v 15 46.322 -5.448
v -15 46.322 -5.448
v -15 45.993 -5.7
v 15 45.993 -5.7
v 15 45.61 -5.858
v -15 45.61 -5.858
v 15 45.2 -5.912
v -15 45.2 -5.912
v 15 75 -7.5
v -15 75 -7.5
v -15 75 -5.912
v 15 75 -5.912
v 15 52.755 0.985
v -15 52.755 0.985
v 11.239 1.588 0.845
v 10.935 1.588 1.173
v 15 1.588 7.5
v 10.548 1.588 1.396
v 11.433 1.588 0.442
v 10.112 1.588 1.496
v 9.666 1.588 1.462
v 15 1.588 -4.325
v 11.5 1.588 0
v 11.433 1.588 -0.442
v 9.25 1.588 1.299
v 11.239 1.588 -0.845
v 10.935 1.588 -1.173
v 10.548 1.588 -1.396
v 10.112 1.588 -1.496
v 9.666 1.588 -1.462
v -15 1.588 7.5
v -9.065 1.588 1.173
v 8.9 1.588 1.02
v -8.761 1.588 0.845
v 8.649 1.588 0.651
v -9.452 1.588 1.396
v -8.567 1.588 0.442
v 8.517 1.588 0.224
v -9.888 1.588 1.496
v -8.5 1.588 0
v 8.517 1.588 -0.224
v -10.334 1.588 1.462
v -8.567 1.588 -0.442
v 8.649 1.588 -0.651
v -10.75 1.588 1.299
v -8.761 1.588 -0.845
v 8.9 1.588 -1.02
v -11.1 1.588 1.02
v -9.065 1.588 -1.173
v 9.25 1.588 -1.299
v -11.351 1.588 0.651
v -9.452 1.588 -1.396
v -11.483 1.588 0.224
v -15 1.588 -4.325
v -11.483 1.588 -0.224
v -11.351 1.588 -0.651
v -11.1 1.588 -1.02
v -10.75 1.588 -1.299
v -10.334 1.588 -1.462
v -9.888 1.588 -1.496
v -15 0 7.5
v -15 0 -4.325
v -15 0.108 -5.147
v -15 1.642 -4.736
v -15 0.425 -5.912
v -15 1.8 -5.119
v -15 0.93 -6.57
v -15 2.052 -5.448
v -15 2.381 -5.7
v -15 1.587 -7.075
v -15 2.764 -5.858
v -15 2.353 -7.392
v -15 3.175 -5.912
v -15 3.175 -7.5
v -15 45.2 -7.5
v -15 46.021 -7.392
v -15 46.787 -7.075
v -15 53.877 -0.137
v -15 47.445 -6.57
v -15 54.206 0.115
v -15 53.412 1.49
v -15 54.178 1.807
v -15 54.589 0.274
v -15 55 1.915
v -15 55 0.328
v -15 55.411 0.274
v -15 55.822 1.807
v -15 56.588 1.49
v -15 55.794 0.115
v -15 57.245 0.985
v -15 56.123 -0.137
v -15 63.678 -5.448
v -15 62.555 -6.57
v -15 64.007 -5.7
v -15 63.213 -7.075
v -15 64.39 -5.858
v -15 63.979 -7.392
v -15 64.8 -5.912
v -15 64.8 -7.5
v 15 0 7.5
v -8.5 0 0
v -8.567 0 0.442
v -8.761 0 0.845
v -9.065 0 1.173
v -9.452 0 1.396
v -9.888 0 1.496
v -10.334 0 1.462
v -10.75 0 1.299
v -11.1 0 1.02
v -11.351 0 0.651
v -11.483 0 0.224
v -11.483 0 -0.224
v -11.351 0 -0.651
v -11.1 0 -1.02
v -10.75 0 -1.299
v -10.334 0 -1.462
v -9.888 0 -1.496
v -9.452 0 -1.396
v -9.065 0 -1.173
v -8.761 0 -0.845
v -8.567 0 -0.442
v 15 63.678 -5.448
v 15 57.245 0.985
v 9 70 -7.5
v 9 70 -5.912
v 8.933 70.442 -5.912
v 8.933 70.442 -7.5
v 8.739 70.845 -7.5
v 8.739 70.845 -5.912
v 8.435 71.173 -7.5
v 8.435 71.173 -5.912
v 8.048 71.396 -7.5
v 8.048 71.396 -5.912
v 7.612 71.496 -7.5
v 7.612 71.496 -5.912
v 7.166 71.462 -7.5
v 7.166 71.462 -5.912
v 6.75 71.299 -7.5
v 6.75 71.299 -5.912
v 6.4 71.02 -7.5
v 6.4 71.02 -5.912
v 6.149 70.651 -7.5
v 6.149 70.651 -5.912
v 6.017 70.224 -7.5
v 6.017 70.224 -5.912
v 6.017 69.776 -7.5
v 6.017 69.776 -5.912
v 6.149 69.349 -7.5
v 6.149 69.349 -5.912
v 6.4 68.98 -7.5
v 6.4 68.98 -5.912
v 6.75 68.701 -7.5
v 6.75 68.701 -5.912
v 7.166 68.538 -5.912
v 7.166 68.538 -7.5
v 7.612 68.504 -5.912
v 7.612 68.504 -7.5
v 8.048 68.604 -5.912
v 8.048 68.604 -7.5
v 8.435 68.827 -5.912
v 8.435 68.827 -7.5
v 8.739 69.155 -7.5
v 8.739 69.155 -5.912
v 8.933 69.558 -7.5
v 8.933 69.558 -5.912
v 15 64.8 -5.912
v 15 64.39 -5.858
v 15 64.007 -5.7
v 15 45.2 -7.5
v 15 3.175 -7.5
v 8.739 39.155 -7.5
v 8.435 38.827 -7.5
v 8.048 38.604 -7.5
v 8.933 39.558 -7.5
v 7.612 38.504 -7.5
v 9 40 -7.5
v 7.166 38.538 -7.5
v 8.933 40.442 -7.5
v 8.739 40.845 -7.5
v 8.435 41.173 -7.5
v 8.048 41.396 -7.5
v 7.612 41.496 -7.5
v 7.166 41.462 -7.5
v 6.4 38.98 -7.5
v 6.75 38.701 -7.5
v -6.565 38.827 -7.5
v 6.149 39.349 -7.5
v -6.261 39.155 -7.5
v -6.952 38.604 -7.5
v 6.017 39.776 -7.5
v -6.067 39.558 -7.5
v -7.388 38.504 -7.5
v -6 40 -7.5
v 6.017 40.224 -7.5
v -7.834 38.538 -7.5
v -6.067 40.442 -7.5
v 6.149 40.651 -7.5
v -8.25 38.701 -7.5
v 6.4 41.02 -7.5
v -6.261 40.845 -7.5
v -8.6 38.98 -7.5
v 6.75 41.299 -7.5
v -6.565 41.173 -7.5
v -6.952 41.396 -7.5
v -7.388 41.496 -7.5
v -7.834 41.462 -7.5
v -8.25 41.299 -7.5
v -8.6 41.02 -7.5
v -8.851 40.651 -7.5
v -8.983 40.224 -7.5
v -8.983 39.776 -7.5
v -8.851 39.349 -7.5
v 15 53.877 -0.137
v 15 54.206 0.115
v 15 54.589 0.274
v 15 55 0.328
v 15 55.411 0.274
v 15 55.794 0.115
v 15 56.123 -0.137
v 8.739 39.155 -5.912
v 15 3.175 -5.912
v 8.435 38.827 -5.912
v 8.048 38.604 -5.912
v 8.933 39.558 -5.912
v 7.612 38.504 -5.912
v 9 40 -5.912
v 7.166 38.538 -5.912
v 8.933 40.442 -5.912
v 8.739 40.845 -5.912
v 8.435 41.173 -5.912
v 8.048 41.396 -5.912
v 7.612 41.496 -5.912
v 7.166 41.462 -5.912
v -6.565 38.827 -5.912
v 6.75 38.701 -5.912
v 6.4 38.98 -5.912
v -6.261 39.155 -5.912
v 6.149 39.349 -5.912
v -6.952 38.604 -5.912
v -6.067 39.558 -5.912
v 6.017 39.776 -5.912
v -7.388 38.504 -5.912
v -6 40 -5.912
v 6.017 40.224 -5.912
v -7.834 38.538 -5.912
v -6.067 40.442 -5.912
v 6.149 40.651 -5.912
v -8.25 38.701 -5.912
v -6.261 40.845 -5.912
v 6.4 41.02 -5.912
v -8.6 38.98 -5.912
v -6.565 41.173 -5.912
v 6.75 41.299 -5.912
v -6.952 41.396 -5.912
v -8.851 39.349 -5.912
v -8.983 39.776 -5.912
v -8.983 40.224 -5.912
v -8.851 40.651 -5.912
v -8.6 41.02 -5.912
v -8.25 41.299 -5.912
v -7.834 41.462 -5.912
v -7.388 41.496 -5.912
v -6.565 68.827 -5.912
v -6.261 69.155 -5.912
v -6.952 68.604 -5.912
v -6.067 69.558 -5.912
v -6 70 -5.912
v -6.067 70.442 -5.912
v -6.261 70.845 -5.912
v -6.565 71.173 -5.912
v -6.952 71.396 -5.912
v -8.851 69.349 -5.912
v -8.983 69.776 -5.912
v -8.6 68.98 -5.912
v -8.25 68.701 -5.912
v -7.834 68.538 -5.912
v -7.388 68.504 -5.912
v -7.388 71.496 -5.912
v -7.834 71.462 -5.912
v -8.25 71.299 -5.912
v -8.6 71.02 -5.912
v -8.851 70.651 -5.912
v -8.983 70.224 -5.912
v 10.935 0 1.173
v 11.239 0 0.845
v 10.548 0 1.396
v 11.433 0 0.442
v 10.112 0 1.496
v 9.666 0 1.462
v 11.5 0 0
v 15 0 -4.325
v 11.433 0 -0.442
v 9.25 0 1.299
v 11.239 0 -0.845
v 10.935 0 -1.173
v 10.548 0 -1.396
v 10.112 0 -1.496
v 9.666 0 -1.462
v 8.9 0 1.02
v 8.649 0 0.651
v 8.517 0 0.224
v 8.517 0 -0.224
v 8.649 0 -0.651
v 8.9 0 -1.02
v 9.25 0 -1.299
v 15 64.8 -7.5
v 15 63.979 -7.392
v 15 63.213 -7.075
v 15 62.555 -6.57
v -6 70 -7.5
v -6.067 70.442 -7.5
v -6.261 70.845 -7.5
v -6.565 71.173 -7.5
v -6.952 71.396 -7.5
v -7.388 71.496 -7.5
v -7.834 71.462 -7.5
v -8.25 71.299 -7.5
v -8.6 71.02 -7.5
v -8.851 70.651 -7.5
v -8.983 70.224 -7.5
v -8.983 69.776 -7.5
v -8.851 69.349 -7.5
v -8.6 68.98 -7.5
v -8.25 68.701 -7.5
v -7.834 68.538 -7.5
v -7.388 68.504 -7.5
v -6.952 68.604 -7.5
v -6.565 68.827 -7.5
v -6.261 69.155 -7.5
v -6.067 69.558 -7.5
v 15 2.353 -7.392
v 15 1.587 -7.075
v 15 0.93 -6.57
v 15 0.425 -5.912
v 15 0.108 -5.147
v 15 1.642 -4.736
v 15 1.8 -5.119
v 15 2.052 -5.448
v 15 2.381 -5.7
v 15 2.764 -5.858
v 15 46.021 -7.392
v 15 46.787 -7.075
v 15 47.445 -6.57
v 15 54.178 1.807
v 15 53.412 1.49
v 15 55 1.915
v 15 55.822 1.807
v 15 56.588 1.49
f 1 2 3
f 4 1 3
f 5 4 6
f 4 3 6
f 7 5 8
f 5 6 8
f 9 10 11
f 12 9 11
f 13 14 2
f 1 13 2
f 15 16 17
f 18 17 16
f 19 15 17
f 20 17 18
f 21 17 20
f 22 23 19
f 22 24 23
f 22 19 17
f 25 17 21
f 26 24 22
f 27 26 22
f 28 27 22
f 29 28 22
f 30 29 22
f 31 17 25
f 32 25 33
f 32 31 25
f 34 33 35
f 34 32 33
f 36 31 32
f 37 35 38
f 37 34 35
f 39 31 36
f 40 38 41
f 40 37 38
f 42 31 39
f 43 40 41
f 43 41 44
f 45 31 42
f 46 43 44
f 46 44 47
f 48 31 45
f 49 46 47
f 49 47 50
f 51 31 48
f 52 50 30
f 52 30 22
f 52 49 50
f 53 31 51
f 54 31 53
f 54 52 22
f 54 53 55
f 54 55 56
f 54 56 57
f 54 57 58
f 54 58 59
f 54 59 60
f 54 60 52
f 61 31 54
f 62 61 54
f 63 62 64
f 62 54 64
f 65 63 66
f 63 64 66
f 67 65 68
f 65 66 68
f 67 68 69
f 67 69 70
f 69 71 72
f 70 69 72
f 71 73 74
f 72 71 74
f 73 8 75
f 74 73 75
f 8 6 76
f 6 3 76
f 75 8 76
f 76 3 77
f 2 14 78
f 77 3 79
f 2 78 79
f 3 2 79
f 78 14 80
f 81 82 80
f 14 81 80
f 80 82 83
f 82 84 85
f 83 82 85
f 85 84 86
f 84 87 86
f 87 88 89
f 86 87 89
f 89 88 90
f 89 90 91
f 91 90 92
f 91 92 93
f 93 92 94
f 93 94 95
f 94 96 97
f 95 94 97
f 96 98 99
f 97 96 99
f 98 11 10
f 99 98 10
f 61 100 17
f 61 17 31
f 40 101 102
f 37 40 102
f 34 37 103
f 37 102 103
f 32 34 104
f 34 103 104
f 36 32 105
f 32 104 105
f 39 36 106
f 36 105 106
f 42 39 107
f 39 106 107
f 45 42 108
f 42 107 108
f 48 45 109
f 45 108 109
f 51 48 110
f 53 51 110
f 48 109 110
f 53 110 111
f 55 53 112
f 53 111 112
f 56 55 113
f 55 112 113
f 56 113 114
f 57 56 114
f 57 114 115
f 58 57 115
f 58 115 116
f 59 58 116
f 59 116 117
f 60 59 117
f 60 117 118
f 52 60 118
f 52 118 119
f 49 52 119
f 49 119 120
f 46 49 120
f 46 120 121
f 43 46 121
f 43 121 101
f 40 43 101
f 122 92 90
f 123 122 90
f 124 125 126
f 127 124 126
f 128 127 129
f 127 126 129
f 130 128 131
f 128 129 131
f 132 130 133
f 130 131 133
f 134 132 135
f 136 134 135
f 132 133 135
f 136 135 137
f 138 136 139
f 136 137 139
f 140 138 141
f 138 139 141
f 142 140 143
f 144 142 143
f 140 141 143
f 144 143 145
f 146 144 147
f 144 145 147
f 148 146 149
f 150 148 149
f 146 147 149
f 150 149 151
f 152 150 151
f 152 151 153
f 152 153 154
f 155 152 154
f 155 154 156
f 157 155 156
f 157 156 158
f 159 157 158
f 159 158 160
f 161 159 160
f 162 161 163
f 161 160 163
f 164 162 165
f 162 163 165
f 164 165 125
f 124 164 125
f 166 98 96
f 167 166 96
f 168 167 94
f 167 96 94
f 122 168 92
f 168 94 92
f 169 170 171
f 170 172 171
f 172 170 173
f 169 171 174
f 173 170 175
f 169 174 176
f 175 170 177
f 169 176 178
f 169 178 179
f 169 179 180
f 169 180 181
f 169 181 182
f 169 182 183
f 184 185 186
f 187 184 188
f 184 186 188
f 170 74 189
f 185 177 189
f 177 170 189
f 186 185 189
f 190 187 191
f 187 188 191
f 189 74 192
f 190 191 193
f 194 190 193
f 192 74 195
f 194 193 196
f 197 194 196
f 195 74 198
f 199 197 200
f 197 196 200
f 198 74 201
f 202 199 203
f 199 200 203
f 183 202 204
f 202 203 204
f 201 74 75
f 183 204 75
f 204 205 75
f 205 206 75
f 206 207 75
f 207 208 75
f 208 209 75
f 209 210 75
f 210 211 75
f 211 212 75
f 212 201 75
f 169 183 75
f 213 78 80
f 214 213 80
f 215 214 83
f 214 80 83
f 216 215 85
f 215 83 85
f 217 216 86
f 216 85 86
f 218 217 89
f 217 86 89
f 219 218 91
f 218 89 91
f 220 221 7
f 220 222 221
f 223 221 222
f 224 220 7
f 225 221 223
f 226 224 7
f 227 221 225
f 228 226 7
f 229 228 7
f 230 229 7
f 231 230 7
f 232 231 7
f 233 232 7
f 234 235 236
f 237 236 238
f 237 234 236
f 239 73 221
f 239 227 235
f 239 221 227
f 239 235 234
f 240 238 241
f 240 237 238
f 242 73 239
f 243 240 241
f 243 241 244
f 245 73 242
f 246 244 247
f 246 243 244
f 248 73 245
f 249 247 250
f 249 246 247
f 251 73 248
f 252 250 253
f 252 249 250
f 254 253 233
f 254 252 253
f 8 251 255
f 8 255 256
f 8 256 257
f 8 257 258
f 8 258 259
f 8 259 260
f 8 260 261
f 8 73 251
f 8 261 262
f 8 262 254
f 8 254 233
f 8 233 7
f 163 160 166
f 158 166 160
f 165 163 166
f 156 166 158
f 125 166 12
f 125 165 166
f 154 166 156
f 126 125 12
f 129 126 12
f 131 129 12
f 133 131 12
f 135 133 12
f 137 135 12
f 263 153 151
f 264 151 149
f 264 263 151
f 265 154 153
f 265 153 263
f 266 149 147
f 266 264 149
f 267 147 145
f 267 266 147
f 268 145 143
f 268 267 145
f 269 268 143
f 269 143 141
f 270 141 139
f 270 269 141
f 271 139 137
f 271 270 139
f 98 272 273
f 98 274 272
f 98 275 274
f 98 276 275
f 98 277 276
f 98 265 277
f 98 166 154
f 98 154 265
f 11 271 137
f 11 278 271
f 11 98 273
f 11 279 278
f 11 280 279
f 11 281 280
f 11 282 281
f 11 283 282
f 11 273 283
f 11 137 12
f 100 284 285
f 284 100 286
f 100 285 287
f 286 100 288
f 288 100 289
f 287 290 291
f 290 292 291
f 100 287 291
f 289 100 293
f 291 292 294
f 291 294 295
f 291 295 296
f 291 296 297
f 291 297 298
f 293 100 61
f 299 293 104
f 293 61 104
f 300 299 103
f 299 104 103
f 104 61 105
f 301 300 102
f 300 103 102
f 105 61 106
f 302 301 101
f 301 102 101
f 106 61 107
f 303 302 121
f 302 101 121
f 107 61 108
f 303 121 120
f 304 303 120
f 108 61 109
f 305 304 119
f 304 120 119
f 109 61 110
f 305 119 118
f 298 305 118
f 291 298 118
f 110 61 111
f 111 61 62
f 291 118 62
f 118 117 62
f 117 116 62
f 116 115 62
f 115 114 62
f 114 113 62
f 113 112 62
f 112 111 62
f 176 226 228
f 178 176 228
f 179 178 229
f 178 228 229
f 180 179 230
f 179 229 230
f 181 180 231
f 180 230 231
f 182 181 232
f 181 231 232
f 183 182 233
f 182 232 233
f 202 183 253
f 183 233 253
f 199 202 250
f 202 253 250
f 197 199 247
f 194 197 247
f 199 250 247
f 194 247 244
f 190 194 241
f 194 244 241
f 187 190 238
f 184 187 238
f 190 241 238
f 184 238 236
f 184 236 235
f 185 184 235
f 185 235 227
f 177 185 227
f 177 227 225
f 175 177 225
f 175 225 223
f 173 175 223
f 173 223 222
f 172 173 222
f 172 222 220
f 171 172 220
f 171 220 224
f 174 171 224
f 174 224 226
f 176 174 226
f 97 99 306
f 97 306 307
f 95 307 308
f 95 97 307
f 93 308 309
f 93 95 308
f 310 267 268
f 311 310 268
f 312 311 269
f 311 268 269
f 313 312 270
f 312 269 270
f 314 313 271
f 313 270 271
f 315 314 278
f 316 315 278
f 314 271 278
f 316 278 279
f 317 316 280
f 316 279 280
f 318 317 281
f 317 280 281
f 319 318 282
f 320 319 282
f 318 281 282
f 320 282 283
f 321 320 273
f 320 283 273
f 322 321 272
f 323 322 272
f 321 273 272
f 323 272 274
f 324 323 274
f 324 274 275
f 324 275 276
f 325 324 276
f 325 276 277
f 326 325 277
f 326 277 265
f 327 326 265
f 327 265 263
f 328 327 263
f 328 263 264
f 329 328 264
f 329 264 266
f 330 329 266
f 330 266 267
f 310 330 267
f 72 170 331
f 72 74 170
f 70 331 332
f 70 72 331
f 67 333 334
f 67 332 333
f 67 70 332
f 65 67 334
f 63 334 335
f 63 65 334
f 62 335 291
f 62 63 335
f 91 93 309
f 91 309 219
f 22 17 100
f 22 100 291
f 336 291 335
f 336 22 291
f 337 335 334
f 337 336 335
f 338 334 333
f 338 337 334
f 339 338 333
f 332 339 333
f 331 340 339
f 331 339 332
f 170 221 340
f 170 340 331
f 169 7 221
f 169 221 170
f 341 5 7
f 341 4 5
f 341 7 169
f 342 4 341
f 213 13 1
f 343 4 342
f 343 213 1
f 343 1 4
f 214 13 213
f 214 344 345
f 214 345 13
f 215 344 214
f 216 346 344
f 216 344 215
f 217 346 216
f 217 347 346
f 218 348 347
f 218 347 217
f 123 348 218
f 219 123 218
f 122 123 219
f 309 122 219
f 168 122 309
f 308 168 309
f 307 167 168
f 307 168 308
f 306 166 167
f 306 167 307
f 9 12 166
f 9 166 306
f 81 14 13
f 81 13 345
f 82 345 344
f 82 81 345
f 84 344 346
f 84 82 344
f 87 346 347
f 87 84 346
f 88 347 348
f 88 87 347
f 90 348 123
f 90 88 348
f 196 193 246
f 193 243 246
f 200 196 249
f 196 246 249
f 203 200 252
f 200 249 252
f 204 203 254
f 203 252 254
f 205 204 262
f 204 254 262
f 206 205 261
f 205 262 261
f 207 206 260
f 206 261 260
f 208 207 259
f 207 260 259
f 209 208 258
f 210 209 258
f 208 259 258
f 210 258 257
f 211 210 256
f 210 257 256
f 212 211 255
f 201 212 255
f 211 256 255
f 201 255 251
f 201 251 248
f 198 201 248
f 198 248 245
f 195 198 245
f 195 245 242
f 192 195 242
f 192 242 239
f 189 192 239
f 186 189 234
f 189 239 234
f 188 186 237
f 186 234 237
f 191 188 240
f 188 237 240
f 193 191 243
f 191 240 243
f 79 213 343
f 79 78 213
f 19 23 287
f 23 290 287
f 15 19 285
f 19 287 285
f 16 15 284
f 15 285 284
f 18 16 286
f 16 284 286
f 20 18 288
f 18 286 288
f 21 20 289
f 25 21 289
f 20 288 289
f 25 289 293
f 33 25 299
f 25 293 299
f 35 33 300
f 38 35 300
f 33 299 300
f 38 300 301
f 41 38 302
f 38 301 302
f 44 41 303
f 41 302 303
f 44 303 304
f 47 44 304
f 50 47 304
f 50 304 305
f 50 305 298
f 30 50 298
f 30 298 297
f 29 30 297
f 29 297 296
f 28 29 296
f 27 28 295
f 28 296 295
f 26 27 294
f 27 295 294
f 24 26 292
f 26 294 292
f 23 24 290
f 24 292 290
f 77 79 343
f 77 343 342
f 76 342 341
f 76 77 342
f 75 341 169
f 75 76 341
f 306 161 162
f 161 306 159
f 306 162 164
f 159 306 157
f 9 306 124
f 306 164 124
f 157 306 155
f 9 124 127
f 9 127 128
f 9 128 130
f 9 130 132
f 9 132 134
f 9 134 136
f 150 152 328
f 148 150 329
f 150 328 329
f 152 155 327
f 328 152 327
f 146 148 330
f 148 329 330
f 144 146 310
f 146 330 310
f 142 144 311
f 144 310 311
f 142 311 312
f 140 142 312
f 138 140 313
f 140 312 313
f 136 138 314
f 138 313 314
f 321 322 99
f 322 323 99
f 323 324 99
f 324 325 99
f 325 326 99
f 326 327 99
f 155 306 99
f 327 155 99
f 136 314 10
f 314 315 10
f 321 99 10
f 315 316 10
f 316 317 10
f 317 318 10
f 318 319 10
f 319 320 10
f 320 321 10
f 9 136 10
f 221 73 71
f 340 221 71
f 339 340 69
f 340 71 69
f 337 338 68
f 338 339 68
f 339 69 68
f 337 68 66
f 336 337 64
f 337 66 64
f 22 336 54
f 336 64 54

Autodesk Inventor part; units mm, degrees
ref_plane "YZ Plane" through (0, 0, 0) normal (1, 0, 0) x (0, 1, 0)
ref_plane "XZ Plane" through (0, 0, 0) normal (0, 1, 0) x (-1, 0, 0)
ref_plane "XY Plane" through (0, 0, 0) normal (0, 0, 1) x (1, 0, 0)
sketch "Sketch1" plane through (0, 0, 0) normal (0, 1, 0) x (-1, 0, 0)
  line L0 (15, -7.5) -> (-15, -7.5)
  line L1 (-15, -7.5) -> (-15, 7.5)
  line L2 (-15, 7.5) -> (15, 7.5)
  line L3 (15, 7.5) -> (15, -7.5)
  line L4 (15, -7.5) -> (-15, 7.5) construction
  line L5 (-15, -7.5) -> (15, 7.5) construction
  point P0 (0, 0)
  dimension "d10" = 30
  dimension "d11" = 15
extrude "Plate1" add sketch "Sketch1" along normal blind 1.5875
sketch "Sketch3" plane through (15, 0, 7.5) normal (1, 0, 0) x (0, 0, -1)
  line L0 (15, 0) -> (15, 1.5875)
  line L1 (15, 0) -> (15, 46.5147)
  line L2 (15, 0) -> (0, 0)
  line L3 (15, 63.4853) -> (15, 75)
  line L4 (6.5147, 55) -> (15, 46.5147)
  line L5 (15, 63.4853) -> (6.5147, 55)
  point P0 (7.5, 0)
  point P1 (15, 55)
  dimension "d48" = 75
  dimension "d91" = 55
  dimension "d92" = 0
  dimension "d94" = 90
  dimension "d95" = 135
  dimension "d96" = 6
  dimension "d97" = 6
contour flange "Contour Flange4" sketch "Sketch3" thickness 1.5875 bend radius 1.5875 curves L1 L4 L5 L3 edges at (0, 1.5875, -7.5) running between points at (15, 1.5875, -7.5) (-15, 1.5875, -7.5)
bend "Bend4"
corner "Corner4"
sketch "Sketch4" plane through (-15, 75, -5.9125) normal (0, 0, 1) x (1, 0, 0)
  line L0 (0, -10.1996) -> (30, -10.1996) projected
  line L1 (30, 0) -> (0, 0) projected
  line L2 (0, 0) -> (0, -10.1996) projected
  circle A0 centre (7.5, -5) radius 1.5
  line L3 (15, 0) -> (15, -10.1996)
  circle A1 centre (22.5, -5) radius 1.5
  point P0 (15, -75)
  dimension "d50" = 3
  dimension "d52" = 5
  dimension "d53" = 7.5
extrude "Cut1" cut sketch "Sketch4" against normal blind 1.5875 contours A0 | A1
sketch "Sketch9" plane through (-15, 45.1996, -5.9125) normal (0, 0, 1) x (1, 0, 0)
  line L0 (0, 0) -> (30, 0) projected
  line L1 (0, 0) -> (0, -42.0246) projected
  line L2 (0, -42.0246) -> (30, -42.0246) projected
  line L3 (30, 0) -> (30, -42.0246) projected
  circle A0 centre (7.5, -5.1996) radius 1.5
  line L4 (15, -42.0246) -> (15, 0)
  line L5 (0, -5.1996) -> (30, -5.1996)
  circle A1 centre (22.5, -5.1996) radius 1.5
  circle A2 centre (22.5, 24.8004) radius 1.5 projected
  point P0 (15, -45.1996)
  dimension "d79" = 3
  dimension "d81" = 7.5
  dimension "d84" = 30
extrude "Cut4" cut sketch "Sketch9" against normal blind 1.5875 contours L5 A0 | A0 L5 | A1 L5 | L5 A1
sketch "Sketch8" plane through (0, 0, 0) normal (0, -1, 0) x (1, 0, 0)
  line L0 (0, 0) -> (-15, 0)
  line L1 (-15, 0) -> (-15, 7.5)
  line L2 (-15, 7.5) -> (0, 7.5)
  line L3 (0, 7.5) -> (0, 0)
  circle A0 centre (-10, 0) radius 1.5
  circle A1 centre (10, 0) radius 1.5
  dimension "d75" = 3
  dimension "d76" = 5
extrude "Cut3" cut sketch "Sketch8" against normal blind 1.5875 contours A0 L0 | L0 A0 | A1
equation "\"d10\" = laser_x"
equation "\"d11\" = laser_y"
equation "\"d48\" = laser_z"
equation "\"d50\" = m3_diameter"
equation "\"d53\" = 0.25 * laser_x"
equation "\"d54\" = Thickness"
equation "\"d79\" = m3_diameter"
equation "\"d81\" = 0.25 * laser_x"
equation "\"d82\" = Thickness"
equation "\"d75\" = m3_diameter"
equation "\"d76\" = 0.166667 * laser_x"
equation "\"d77\" = Thickness"
equation "\"Thickness\" = sm_thickness"
equation "\"d36\" = BendReliefWidth"
equation "\"d37\" = BendReliefDepth"
equation "\"d38\" = MinimumRemnant"
equation "\"d39\" = BendRadius"
equation "\"d40\" = BendRadius"
equation "\"d42\" = CornerReliefSize"
equation "\"d43\" = GapSize"
equation "\"d44\" = JacobiRadiusSize"
equation "\"BendRadius\" = Thickness"
equation "\"BendReliefWidth\" = Thickness"
equation "\"BendReliefDepth\" = 0.5 * Thickness"
equation "\"CornerReliefSize\" = 4 * Thickness"
equation "\"MinimumRemnant\" = 2 * Thickness"
equation "\"TransitionRadius\" = BendRadius"
equation "\"JacobiRadiusSize\" = BendRadius"
equation "\"GapSize\" = Thickness"
equation "\"d0\" = BendRadius"
equation "\"sm_thickness\" = 1.5875"
equation "\"very_thick_acrylic\" = 9.45"
equation "\"thick_acrylic\" = 5.88"
equation "\"thin_acrylic\" = 3.15"
equation "\"clear_acrylic\" = 3.15"
equation "\"wood_thickness\" = 6.72"
equation "\"m3_diameter\" = 3"
equation "\"m3_head\" = 6"
equation "\"m4_diameter\" = 4"
equation "\"m5_diameter\" = 5"
equation "\"m5_head\" = 10.3"
equation "\"brass_insert_drill\" = 4"
equation "\"m5_brass_insert_drill\" = 6.7"
equation "\"m3_press_nut_drill\" = 4.5"
equation "\"m5_press_nut_drill\" = 6.5"
equation "\"stepper_screw_space\" = 35"
equation "\"stepper_shaft_diameter\" = 5"
equation "\"stepper_body_diameter\" = 28"
equation "\"laser_body_diameter\" = 12"
equation "\"carrier_y\" = 251"
equation "\"carrier_z\" = 12"
equation "\"visor_x\" = 253.925"
equation "\"visor_y\" = 85.6"
equation "\"window_z\" = 332.225"
equation "\"window_y\" = 93.75"
equation "\"window_overlap\" = 48"
equation "\"acrylic_into_frame\" = 5"
equation "\"door_x\" = 251"
equation "\"door_z\" = 332.225"
equation "\"door_overlap\" = 48"
equation "\"reservoir_x\" = 201"
equation "\"reservoir_y\" = 201"
equation "\"linear_bearing_spacing\" = 271"
equation "\"tray_border\" = 25"
equation "\"tray_x\" = 251"
equation "\"tray_y\" = 251"
equation "\"bed_z\" = 25"
equation "\"crane_z2\" = 12"
equation "\"end_stop_spacing\" = 19"
equation "\"thumb_nut_offset_y\" = 0"
equation "\"thumb_nut_diameter\" = 7"
equation "\"z_min_from_center\" = 115"
equation "\"frame_top_z\" = 385"
equation "\"frame_bottom_z\" = 275"
equation "\"frame_total_z\" = 661.5875"
equation "\"frame_border\" = 48.0375"
equation "\"frame_foot_z\" = 12"
equation "\"frame_tilt\" = 1deg"
equation "\"subframe_x\" = 66"
equation "\"subframe_y_offset\" = 27.5"
equation "\"laser_y_offset\" = 19.4"
equation "\"laser_diameter\" = 12"
equation "\"laser_z_offset\" = 55"
equation "\"laser_y\" = 15"
equation "\"laser_z\" = 75"
equation "\"laser_x\" = 30"
equation "\"t_galvo_frame\" = 6.72"
equation "\"galvo_frame_x\" = 66"
equation "\"galvo_frame_z\" = 85"
equation "\"galvo_frame_y_offset\" = 27.5"
equation "\"drawer_x\" = 257.3"
equation "\"drawer_y\" = 90.3375"
equation "\"drawer_z\" = 278.175"
equation "\"drawer_support_from_top\" = 48"
equation "\"nema17_x\" = 43"
equation "\"laser_gap\" = 1"
equation "\"frame_screw_from_center\" = 25"
equation "\"drawer_screw_from_center\" = 55"
equation "\"frame_face_y\" = 45"
equation "\"switch_spacing\" = 19"
equation "\"subframe_y\" = 55"
equation "\"al_thickness\" = 1.5875"
equation "\"rivet_diameter\" = 3.3"
equation "\"bend_factor\" = 2.26205"
equation "\"al_bend\" = 3.591"
equation "\"sm_bend\" = 3.591"
equation "\"frame_x\" = 353.375"
equation "\"carrier_z2\" = 25"
equation "\"carrier_y2\" = 76.825"
properties part number "laserholder"
